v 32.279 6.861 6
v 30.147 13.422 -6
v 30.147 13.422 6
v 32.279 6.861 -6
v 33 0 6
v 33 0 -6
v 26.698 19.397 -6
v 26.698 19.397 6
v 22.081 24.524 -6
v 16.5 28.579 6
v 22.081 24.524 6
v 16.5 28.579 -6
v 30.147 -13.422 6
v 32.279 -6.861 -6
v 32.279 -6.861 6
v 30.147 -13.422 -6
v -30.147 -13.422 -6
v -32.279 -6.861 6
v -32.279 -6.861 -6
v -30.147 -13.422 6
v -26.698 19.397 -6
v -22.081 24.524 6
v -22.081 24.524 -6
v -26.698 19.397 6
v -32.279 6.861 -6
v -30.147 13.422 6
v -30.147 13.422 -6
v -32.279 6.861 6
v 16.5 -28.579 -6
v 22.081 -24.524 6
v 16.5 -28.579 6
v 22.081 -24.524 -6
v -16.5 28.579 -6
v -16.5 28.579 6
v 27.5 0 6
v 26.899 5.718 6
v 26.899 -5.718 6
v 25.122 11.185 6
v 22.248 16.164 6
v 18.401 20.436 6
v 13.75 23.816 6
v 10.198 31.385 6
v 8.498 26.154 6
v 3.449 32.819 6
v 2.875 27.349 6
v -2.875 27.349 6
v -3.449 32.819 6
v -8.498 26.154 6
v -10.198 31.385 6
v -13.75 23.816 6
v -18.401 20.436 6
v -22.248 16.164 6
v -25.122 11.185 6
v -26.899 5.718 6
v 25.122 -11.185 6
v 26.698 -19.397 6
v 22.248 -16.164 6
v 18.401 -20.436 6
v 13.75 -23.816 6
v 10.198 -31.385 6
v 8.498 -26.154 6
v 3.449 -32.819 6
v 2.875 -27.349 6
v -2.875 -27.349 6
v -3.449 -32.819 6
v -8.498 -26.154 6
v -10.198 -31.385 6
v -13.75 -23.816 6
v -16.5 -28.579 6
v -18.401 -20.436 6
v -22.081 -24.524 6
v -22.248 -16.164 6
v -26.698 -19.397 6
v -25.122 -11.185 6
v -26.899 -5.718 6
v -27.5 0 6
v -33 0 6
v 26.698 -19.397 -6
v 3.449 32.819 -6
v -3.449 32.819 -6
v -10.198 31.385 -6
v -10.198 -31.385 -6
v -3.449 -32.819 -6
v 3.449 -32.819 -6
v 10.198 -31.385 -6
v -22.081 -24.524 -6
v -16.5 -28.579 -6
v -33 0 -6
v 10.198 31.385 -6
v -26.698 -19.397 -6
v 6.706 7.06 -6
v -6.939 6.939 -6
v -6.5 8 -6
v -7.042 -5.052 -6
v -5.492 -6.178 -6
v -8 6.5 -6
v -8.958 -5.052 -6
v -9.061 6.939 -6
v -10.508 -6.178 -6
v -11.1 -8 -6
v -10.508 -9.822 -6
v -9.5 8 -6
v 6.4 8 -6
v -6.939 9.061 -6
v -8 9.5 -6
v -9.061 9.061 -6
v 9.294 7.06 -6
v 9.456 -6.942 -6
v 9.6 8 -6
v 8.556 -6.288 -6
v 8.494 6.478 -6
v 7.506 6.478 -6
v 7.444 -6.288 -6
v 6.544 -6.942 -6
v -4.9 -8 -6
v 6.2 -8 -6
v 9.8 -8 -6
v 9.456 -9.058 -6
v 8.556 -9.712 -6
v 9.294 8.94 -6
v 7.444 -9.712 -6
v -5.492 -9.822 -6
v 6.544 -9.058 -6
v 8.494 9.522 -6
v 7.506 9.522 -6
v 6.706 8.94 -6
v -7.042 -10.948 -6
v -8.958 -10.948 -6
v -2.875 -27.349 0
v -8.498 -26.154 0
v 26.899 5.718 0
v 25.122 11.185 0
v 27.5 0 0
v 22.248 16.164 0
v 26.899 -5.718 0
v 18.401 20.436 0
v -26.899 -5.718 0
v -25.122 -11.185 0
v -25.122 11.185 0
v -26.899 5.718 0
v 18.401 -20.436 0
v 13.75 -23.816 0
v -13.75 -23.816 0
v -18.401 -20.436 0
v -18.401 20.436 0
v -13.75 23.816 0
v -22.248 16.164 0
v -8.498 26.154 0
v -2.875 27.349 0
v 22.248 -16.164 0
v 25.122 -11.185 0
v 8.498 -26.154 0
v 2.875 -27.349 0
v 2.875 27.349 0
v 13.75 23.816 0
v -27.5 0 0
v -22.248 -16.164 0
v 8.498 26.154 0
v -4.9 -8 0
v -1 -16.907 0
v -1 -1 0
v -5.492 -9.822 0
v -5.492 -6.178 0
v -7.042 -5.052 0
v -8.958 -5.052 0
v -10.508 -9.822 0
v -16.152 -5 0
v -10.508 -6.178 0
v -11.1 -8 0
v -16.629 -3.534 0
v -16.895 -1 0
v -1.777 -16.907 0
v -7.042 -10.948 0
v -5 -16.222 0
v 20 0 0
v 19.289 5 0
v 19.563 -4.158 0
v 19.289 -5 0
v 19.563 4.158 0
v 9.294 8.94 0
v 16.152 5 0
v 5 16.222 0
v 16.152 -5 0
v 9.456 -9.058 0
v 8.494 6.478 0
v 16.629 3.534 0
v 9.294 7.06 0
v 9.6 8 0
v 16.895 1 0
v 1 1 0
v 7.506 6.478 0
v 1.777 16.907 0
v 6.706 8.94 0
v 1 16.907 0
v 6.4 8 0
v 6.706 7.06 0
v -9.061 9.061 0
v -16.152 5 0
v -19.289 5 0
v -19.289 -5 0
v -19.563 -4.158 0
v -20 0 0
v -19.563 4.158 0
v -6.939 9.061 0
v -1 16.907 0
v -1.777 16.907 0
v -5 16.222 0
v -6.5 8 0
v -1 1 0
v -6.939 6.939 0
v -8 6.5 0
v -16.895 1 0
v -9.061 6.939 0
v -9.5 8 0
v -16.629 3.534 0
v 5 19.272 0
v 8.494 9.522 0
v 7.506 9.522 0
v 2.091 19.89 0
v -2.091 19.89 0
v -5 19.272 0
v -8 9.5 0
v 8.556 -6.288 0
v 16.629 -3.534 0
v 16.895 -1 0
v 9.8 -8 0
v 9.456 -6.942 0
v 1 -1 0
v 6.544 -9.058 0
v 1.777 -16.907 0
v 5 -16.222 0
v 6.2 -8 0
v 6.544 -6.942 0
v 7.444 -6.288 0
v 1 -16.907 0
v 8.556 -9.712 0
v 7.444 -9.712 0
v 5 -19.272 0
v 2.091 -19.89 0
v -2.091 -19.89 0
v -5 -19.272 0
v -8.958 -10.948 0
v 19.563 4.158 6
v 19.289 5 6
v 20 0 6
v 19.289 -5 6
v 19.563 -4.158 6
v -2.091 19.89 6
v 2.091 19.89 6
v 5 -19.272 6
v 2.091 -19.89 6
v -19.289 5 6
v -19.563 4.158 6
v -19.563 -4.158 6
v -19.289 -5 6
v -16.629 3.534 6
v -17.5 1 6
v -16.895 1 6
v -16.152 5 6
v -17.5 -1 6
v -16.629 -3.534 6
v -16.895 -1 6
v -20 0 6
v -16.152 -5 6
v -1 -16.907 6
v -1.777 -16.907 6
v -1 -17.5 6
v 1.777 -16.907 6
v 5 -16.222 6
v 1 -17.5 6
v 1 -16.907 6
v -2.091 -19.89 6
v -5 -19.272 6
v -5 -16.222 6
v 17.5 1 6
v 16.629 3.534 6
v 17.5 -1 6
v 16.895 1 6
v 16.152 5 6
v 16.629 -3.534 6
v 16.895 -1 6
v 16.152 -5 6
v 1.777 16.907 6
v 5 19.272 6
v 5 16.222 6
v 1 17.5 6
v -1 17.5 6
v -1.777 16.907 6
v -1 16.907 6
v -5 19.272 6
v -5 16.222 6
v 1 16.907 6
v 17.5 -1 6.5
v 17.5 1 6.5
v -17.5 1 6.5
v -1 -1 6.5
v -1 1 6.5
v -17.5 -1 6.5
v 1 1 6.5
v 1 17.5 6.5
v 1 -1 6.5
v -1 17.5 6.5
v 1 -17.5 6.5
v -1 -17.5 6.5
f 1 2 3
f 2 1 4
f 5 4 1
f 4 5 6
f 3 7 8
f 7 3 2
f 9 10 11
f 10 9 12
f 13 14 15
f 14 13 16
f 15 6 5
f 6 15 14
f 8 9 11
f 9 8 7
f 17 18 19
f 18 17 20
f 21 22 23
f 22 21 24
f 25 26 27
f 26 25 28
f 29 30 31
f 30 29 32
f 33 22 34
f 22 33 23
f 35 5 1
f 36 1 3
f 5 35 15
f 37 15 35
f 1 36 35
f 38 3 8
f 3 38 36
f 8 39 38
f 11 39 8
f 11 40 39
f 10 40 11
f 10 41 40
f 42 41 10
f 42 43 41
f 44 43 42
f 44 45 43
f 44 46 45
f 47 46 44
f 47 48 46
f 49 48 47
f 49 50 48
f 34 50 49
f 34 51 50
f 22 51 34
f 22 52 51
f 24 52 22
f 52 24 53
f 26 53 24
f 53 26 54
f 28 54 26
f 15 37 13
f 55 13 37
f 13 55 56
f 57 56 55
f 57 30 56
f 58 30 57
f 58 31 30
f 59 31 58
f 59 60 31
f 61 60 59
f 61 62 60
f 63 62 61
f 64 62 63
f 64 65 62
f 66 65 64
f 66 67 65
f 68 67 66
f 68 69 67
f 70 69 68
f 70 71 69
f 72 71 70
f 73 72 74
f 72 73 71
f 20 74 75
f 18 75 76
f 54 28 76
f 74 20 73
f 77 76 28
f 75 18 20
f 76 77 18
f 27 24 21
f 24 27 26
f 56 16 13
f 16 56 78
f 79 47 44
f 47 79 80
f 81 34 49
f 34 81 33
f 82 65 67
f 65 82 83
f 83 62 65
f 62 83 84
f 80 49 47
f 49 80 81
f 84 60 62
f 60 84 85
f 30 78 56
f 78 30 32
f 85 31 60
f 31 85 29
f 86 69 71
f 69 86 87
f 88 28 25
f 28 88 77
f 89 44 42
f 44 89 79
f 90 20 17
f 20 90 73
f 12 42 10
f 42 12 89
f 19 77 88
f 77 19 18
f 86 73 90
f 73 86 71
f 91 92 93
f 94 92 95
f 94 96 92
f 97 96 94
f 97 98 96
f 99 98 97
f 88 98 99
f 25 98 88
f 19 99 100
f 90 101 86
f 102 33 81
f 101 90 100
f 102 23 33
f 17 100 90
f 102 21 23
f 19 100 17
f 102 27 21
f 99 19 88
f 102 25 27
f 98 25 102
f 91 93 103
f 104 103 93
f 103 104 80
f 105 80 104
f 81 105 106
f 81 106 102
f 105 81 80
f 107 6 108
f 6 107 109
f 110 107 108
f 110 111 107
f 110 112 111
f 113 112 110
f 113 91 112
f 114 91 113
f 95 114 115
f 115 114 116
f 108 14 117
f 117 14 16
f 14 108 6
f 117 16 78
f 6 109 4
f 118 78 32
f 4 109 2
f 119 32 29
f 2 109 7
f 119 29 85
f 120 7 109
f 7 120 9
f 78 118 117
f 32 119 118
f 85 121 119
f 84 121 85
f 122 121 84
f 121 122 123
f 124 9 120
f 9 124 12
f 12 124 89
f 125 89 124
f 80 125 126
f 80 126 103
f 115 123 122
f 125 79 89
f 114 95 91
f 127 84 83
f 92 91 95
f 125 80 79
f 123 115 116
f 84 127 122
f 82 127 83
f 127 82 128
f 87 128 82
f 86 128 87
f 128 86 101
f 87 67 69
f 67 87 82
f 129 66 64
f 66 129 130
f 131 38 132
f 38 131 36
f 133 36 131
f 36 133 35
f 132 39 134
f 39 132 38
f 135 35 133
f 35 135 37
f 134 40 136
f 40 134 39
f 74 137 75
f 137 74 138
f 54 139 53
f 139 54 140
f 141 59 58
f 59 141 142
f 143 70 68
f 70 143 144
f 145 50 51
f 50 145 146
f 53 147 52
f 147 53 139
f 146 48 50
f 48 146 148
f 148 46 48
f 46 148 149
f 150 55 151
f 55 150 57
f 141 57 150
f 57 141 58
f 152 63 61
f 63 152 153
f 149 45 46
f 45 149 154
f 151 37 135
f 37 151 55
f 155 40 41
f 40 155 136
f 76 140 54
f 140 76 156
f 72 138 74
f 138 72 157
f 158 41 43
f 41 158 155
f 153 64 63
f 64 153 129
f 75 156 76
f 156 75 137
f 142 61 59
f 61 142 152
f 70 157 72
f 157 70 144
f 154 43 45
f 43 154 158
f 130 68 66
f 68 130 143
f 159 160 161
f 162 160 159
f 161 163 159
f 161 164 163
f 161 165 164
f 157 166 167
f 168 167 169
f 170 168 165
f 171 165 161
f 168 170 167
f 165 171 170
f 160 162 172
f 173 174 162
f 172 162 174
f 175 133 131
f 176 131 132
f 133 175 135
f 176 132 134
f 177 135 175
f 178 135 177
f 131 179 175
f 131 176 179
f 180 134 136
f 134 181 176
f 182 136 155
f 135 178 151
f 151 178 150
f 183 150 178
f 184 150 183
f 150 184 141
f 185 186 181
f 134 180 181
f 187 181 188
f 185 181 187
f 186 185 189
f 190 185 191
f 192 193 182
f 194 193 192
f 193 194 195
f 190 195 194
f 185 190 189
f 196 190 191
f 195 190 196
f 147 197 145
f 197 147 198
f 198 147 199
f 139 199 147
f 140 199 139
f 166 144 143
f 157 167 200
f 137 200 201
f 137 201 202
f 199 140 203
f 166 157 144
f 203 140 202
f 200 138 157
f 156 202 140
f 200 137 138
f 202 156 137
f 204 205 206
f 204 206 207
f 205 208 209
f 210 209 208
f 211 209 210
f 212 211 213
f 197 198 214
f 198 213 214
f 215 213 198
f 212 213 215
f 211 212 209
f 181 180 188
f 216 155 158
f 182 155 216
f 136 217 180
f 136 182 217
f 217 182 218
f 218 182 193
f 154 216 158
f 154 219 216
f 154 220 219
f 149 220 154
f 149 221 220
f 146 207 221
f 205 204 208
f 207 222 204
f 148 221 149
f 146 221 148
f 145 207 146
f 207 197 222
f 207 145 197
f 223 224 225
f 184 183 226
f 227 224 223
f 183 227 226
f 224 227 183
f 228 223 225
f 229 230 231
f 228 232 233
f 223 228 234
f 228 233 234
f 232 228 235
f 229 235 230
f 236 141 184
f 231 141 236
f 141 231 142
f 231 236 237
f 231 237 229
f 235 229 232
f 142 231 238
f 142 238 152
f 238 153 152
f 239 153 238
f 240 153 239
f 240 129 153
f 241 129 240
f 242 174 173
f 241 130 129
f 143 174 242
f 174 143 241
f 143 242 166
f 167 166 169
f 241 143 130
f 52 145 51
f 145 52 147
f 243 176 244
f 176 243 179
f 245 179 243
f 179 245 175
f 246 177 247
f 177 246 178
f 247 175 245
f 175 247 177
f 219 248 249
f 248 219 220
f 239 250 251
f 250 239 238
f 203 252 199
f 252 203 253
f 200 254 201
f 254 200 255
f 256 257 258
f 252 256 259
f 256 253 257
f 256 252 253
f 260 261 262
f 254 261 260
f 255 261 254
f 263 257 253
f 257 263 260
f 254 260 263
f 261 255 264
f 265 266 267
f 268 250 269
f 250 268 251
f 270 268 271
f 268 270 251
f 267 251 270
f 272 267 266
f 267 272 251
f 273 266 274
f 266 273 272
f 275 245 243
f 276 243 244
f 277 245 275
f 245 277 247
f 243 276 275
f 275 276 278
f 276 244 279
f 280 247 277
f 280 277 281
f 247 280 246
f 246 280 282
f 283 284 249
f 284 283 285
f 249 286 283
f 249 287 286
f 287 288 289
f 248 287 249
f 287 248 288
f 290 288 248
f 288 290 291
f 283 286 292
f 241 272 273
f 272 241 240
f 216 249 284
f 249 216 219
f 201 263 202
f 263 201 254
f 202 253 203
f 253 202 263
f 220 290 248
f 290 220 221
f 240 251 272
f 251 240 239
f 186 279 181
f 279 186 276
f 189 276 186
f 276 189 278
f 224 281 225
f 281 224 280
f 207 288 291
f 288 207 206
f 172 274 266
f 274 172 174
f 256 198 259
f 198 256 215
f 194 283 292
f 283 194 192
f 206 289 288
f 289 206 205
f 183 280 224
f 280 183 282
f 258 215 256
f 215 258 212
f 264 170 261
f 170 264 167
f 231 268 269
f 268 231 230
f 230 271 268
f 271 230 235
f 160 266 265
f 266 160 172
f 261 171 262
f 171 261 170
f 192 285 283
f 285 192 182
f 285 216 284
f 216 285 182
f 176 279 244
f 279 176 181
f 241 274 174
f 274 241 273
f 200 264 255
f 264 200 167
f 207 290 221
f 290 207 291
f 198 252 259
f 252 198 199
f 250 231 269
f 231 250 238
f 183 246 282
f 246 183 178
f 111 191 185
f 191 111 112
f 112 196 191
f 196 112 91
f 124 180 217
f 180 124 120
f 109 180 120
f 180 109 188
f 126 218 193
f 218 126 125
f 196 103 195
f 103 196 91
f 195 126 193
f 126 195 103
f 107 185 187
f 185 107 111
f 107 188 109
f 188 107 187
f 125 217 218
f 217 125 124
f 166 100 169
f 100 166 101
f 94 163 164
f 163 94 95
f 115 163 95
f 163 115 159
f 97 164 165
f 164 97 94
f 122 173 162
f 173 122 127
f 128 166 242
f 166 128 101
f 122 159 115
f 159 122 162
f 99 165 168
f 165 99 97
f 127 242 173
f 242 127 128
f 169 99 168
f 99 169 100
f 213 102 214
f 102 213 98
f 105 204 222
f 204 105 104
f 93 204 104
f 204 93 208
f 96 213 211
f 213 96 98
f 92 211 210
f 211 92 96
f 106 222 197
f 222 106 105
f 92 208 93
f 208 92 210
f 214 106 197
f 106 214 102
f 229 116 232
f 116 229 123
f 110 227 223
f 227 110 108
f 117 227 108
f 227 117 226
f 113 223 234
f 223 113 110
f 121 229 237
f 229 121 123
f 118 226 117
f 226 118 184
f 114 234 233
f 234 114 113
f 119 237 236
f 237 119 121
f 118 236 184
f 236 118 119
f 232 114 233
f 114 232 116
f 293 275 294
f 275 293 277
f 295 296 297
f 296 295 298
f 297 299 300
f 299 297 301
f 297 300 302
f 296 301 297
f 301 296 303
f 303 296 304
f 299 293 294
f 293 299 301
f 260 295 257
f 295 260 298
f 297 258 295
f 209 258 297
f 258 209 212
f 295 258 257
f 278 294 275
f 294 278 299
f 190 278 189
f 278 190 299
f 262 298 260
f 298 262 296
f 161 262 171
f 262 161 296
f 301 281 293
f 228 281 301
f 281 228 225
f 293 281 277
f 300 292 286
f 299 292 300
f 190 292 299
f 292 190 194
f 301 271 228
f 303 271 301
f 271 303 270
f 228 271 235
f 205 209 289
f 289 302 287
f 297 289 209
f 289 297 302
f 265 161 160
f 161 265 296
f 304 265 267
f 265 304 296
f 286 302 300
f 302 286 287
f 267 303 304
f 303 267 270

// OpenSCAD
// 2L
insideradius = 20;
outsideradius = 27.5;

// 250mL
//insideradius = 11;
//outsideradius = 18.3;

// 100mL
//insideradius = 9.3;
//outsideradius = 16.1;

// Loose fitting
//insideradius = 9;
//outsideradius = 16.5;

// Small
//height = 12;
//inletradius = 1.5;
//filterradius= 2.8;
//inducerradius = 1.2;
//sampleradius = 1.5;
height = 12;
inletradius = 1.6;
filterradius= 3.1;
inducerradius = 1.5;
sampleradius = 1.8;

// small bottles
//c0 = 14;
//cA = c0;
//cB = c0;
//large bottle
c0 = 18;
cA = c0;
cB = c0;

// small 
// t0 = 10;  // tab spacing
// cx = 7;
//Large
t0 = 14;  // tab spacing

tt = 3;   // tab thickness
//i0 = 4;  //inlet spacing small
i0 = 8;   // inlet spacing large
cx = 15;
module cross() {
   cube([cx+insideradius,2,height-3],center=true);
   cube([2,cx+insideradius,height-3],center=true);
}

module base(size) {

    difference() {
     cylinder(r=outsideradius+(outsideradius/5),
            h=size,center=true);
     translate([0,0,size/2])
        cylinder(r=outsideradius,h=size,center=true);
    } 
}
module tabs(size) {
    difference() {
     cylinder(r=insideradius,h=size,center=true);
     translate([0,0,size/2])
        cylinder(r=insideradius-tt,h=size,center=true);
     translate([t0,t0,0])
		    cube([cA,cB,height+2],center=true);
     translate([-t0,-t0,0])
		    cube([cA,cB,height+2],center=true);
     translate([-t0,t0,0])
		    cube([cA,cB,height+2],center=true);
     translate([t0,-t0,0])
		    cube([cA,cB,height+2],center=true);
    } 
}
module cap() {
	base(height);
 // rotate([0,0,45])
    tabs(height);
}
module septa() {
     difference() {
        cap();
        translate([i0,i0,0])
			      cylinder(r=inletradius,h=30,center=true,$fn=10);
        translate([-i0,-i0,0])
			      cylinder(r=filterradius,h=30,center=true);
        translate([-i0,i0,0])
			      cylinder(r=inducerradius,h=30,center=true,$fn=8);
        translate([i0,-i0,0])
			      cylinder(r=sampleradius,h=30,center=true,$fn=10);

     }
}
septa();
translate([0,0,2]) cross();
